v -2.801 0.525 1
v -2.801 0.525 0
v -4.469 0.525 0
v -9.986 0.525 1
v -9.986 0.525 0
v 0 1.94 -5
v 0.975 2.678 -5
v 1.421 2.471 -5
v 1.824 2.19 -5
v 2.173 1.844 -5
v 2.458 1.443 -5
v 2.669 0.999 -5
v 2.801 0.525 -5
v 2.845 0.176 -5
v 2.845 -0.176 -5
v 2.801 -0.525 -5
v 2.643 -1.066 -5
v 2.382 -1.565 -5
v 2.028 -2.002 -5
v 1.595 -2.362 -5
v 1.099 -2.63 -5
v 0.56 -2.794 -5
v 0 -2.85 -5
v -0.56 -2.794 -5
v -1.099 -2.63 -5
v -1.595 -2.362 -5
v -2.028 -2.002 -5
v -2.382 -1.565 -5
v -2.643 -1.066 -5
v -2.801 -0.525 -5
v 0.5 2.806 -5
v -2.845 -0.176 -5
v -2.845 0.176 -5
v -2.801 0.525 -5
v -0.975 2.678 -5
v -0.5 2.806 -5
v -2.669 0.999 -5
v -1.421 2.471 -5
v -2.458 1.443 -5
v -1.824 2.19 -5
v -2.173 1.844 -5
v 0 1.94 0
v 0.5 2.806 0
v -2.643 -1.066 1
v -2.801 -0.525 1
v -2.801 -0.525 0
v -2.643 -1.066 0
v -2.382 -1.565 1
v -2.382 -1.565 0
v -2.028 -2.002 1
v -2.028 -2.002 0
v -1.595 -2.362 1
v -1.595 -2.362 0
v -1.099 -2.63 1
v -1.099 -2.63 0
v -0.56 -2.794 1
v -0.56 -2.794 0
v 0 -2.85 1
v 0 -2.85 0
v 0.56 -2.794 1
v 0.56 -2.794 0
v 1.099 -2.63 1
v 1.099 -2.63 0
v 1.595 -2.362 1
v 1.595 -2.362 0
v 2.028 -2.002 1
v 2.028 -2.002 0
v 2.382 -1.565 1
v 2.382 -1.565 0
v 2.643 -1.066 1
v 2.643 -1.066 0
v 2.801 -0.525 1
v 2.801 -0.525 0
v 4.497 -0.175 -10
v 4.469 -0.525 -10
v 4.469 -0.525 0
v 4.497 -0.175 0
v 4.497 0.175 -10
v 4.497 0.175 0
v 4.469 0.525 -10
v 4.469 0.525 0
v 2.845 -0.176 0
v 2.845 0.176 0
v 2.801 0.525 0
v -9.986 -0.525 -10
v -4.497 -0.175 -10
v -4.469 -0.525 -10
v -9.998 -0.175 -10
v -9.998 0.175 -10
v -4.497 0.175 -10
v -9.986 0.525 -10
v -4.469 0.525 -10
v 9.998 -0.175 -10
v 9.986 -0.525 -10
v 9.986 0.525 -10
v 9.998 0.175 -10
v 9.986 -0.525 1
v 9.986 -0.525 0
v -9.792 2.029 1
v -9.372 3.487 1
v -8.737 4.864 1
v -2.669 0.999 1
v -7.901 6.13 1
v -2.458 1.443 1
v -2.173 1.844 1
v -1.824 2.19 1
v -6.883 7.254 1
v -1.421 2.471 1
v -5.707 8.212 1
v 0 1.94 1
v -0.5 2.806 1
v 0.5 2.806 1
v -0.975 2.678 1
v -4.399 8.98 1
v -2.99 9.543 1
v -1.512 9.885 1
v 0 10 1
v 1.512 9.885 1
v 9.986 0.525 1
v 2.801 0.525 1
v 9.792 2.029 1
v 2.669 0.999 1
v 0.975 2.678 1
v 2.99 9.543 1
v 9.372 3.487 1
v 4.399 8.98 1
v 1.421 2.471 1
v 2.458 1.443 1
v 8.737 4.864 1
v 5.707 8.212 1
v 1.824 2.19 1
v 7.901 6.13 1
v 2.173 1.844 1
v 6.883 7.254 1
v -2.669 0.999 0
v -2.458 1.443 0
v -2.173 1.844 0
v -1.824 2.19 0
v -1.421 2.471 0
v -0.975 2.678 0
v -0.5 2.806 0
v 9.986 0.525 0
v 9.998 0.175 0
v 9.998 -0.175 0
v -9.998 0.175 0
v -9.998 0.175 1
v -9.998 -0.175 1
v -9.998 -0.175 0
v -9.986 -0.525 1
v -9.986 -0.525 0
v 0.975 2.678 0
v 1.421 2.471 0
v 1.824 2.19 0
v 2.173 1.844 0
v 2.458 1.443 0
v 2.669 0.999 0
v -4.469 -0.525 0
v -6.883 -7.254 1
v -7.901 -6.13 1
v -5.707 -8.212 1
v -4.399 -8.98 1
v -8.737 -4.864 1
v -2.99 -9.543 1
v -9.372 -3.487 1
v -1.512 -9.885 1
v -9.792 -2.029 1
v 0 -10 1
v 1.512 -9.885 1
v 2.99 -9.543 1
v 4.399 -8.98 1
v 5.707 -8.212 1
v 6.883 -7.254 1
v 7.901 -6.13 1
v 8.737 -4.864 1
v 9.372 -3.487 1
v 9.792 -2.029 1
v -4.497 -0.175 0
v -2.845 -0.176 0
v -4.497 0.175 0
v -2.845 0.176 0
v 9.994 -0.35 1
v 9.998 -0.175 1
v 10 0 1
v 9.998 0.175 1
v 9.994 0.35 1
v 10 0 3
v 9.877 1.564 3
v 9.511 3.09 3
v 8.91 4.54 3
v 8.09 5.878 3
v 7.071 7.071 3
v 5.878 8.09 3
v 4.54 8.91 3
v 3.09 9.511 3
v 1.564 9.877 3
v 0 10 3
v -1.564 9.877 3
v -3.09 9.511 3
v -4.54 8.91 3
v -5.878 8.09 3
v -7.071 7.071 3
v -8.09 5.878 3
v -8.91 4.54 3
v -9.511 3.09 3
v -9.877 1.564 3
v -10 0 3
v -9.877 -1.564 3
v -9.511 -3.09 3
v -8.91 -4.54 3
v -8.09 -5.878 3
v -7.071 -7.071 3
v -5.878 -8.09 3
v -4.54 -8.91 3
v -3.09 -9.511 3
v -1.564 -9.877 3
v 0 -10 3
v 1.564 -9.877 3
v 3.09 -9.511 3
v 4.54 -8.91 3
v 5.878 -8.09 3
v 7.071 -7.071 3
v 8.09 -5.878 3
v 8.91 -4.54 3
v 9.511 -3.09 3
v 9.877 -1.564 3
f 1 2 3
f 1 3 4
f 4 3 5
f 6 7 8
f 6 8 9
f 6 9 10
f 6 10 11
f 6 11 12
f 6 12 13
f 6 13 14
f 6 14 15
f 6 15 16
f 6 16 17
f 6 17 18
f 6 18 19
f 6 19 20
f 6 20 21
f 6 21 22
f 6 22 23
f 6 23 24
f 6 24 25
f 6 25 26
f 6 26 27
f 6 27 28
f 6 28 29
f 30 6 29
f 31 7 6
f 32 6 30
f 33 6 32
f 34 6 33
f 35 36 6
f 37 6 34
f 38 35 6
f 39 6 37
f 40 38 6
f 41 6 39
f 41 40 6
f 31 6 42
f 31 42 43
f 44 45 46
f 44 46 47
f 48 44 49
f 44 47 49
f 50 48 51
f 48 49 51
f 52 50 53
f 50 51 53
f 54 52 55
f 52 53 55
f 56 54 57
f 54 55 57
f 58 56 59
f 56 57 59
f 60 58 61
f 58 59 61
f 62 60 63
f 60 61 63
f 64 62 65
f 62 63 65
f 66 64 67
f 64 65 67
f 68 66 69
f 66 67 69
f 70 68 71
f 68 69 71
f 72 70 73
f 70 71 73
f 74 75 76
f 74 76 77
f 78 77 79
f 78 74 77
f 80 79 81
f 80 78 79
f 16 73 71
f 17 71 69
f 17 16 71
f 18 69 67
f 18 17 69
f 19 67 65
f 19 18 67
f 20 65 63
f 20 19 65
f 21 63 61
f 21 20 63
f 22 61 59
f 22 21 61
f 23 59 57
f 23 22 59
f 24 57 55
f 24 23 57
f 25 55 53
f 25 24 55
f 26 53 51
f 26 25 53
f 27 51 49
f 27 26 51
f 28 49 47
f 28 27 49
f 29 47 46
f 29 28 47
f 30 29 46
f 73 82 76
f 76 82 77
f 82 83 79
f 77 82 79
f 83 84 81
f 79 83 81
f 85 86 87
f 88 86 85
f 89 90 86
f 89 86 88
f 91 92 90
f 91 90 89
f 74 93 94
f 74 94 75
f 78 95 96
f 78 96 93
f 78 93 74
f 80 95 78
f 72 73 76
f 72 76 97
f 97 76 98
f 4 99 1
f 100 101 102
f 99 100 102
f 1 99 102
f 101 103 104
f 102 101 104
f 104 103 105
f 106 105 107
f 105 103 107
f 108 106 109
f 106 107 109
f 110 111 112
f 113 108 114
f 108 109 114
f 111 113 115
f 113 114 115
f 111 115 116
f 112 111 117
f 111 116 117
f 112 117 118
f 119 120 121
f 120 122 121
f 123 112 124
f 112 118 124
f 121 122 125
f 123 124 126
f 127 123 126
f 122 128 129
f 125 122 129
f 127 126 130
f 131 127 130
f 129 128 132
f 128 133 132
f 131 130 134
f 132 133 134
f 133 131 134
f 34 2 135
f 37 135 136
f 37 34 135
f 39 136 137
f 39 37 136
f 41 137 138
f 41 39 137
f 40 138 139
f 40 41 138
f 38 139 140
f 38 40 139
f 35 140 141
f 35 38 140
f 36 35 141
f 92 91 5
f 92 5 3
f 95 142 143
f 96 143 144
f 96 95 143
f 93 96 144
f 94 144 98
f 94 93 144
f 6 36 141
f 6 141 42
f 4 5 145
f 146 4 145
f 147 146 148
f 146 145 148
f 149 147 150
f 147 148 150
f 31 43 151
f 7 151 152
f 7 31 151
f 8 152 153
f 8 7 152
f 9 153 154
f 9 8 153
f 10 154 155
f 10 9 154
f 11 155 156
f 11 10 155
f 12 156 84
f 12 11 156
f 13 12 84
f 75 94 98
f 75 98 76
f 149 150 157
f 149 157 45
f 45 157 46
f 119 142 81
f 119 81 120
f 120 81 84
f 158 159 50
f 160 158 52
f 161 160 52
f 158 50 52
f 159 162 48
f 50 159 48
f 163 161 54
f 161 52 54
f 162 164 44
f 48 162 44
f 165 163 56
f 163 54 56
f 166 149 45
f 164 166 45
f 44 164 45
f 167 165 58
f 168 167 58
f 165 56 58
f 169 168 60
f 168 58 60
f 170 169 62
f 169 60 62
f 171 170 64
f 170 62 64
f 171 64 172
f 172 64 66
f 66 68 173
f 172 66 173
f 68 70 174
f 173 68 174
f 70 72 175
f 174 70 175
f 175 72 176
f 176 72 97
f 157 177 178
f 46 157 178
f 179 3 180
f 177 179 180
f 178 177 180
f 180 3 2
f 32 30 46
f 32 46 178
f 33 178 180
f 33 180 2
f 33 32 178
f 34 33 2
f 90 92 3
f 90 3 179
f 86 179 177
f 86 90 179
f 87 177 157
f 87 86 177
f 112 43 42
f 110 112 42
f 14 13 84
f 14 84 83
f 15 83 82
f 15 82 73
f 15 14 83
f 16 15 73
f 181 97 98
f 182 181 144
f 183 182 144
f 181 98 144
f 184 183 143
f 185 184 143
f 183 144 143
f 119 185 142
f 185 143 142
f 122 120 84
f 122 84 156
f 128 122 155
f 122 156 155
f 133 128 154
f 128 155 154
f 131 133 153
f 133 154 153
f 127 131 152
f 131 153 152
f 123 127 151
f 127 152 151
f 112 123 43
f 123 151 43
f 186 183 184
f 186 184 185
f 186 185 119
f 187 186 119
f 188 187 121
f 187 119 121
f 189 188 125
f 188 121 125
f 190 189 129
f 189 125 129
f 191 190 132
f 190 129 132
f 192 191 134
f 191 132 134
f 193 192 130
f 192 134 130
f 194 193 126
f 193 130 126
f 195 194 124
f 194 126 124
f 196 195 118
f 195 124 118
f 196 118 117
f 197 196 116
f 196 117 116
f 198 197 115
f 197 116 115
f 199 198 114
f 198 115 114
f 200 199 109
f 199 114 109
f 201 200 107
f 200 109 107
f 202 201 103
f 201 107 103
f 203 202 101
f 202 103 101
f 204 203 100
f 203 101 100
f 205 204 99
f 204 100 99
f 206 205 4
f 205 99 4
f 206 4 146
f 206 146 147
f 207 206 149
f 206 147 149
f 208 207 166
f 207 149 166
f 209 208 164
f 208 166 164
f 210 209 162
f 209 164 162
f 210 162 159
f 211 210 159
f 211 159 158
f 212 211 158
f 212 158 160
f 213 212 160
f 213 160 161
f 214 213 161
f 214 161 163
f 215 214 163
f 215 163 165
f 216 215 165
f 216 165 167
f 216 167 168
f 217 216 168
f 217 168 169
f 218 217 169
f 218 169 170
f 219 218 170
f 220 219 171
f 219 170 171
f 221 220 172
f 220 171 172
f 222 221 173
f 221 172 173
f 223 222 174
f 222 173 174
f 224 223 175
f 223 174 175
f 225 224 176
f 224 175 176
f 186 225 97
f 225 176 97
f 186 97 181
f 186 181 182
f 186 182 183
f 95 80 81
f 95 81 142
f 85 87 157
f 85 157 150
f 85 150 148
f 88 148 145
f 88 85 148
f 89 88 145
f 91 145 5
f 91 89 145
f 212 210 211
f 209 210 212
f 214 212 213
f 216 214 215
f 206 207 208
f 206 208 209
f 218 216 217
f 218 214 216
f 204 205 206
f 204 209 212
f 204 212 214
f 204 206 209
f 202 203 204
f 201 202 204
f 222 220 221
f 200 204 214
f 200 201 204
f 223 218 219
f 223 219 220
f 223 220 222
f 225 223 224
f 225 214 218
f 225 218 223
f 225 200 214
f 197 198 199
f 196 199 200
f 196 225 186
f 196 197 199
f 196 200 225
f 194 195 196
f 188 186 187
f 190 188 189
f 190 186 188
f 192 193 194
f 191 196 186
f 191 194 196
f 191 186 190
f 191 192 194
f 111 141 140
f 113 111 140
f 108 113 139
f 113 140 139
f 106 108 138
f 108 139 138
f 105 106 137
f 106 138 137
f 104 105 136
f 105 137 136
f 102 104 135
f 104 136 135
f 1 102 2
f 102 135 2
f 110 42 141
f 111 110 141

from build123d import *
from build123d.topology import SkipClean

# Parameters (mm, degrees)
SKETCH1_R           = 2.85
BOSS_EXTRUDE1_DEPTH = 1
SKETCH2_R           = 10
BOSS_EXTRUDE2_DEPTH = 2
BOSS_EXTRUDE3_START = 1
BOSS_EXTRUDE3_DEPTH = 1
CUT_EXTRUDE1_DEPTH  = 1
BOSS_EXTRUDE4_START = 5
BOSS_EXTRUDE4_DEPTH = 5
BOSS_EXTRUDE5_START = 10
BOSS_EXTRUDE5_DEPTH = 10


with BuildPart() as part:
    # Sketch1 → Boss-Extrude1 (new body)
    with BuildSketch(Plane.XY):
        Circle(SKETCH1_R)
    extrude(amount=BOSS_EXTRUDE1_DEPTH)

    # Sketch2 → Boss-Extrude2 (add)
    with BuildSketch(Plane.XY.offset(1)):
        Circle(SKETCH2_R)
    extrude(amount=BOSS_EXTRUDE2_DEPTH)

    # Sketch3 → Boss-Extrude3 (add)
    with BuildSketch(Plane(origin=(0, 0, 1), x_dir=(-1, 0, 0), z_dir=(0, 0, -1)).offset(BOSS_EXTRUDE3_START)):
        with BuildLine():
            Line((-9.986209241, 0.525), (9.986209241, 0.525))
            ThreePointArc((9.986209241, 0.525), (10, 0), (9.986209241, -0.525))
            Line((9.986209241, -0.525), (-9.986209241, -0.525))
            ThreePointArc((-9.986209241, -0.525), (-10, 0), (-9.986209241, 0.525))
        make_face()
    extrude(amount=-BOSS_EXTRUDE3_DEPTH)

    # Sketch4 → Cut-Extrude1 (cut)
    with BuildSketch(Plane(origin=(0, 0, 0), x_dir=(-1, 0, 0), z_dir=(0, 0, -1))):
        with BuildLine():
            ThreePointArc((0.5, 2.805797569), (0, 2.85), (-0.5, 2.805797569))
            Line((-0.5, 2.805797569), (0, 1.939772166))
            Line((0, 1.939772166), (0.5, 2.805797569))
        make_face()
    extrude(amount=-CUT_EXTRUDE1_DEPTH, mode=Mode.SUBTRACT)

    # Sketch5 → Boss-Extrude4 (add)
    with SkipClean():  # the faces are left unmerged after this step: merging them gives an invalid solid
        with BuildSketch(Plane(origin=(0, 0, 0), x_dir=(-1, 0, 0), z_dir=(0, 0, -1)).offset(BOSS_EXTRUDE4_START)):
            with BuildLine():
                ThreePointArc((2.80122741, 0.525), (2.006248985, 2.024219605), (0.5, 2.805797569))
                Line((0.5, 2.805797569), (0, 1.939772166))
                Line((0, 1.939772166), (-0.5, 2.805797569))
                ThreePointArc((-0.5, 2.805797569), (-2.006248985, 2.024219605), (-2.80122741, 0.525))
                ThreePointArc((-2.80122741, 0.525), (-2.85, 0), (-2.80122741, -0.525))
                ThreePointArc((-2.80122741, -0.525), (0, -2.85), (2.80122741, -0.525))
                ThreePointArc((2.80122741, -0.525), (2.85, 0), (2.80122741, 0.525))
            make_face()
        extrude(amount=-BOSS_EXTRUDE4_DEPTH)

    # Sketch6 → Boss-Extrude5 (add)
    with SkipClean():  # the faces are left unmerged after this step: merging them gives an invalid solid
        with BuildSketch(Plane(origin=(0, 0, 0), x_dir=(-1, 0, 0), z_dir=(0, 0, -1)).offset(BOSS_EXTRUDE5_START)):
            with BuildLine():
                ThreePointArc((-4.469270075, -0.525), (-4.5, 0), (-4.469270075, 0.525))
                Line((-4.469270075, 0.525), (-9.986209241, 0.525))
                ThreePointArc((-9.986209241, 0.525), (-10, 0), (-9.986209241, -0.525))
                Line((-9.986209241, -0.525), (-4.469270075, -0.525))
            make_face()
            with BuildLine():
                ThreePointArc((4.469270075, 0.525), (4.5, 0), (4.469270075, -0.525))
                Line((4.469270075, -0.525), (9.986209241, -0.525))
                ThreePointArc((9.986209241, -0.525), (10, 0), (9.986209241, 0.525))
                Line((9.986209241, 0.525), (4.469270075, 0.525))
            make_face()
        extrude(amount=-BOSS_EXTRUDE5_DEPTH)


solid = part.part
